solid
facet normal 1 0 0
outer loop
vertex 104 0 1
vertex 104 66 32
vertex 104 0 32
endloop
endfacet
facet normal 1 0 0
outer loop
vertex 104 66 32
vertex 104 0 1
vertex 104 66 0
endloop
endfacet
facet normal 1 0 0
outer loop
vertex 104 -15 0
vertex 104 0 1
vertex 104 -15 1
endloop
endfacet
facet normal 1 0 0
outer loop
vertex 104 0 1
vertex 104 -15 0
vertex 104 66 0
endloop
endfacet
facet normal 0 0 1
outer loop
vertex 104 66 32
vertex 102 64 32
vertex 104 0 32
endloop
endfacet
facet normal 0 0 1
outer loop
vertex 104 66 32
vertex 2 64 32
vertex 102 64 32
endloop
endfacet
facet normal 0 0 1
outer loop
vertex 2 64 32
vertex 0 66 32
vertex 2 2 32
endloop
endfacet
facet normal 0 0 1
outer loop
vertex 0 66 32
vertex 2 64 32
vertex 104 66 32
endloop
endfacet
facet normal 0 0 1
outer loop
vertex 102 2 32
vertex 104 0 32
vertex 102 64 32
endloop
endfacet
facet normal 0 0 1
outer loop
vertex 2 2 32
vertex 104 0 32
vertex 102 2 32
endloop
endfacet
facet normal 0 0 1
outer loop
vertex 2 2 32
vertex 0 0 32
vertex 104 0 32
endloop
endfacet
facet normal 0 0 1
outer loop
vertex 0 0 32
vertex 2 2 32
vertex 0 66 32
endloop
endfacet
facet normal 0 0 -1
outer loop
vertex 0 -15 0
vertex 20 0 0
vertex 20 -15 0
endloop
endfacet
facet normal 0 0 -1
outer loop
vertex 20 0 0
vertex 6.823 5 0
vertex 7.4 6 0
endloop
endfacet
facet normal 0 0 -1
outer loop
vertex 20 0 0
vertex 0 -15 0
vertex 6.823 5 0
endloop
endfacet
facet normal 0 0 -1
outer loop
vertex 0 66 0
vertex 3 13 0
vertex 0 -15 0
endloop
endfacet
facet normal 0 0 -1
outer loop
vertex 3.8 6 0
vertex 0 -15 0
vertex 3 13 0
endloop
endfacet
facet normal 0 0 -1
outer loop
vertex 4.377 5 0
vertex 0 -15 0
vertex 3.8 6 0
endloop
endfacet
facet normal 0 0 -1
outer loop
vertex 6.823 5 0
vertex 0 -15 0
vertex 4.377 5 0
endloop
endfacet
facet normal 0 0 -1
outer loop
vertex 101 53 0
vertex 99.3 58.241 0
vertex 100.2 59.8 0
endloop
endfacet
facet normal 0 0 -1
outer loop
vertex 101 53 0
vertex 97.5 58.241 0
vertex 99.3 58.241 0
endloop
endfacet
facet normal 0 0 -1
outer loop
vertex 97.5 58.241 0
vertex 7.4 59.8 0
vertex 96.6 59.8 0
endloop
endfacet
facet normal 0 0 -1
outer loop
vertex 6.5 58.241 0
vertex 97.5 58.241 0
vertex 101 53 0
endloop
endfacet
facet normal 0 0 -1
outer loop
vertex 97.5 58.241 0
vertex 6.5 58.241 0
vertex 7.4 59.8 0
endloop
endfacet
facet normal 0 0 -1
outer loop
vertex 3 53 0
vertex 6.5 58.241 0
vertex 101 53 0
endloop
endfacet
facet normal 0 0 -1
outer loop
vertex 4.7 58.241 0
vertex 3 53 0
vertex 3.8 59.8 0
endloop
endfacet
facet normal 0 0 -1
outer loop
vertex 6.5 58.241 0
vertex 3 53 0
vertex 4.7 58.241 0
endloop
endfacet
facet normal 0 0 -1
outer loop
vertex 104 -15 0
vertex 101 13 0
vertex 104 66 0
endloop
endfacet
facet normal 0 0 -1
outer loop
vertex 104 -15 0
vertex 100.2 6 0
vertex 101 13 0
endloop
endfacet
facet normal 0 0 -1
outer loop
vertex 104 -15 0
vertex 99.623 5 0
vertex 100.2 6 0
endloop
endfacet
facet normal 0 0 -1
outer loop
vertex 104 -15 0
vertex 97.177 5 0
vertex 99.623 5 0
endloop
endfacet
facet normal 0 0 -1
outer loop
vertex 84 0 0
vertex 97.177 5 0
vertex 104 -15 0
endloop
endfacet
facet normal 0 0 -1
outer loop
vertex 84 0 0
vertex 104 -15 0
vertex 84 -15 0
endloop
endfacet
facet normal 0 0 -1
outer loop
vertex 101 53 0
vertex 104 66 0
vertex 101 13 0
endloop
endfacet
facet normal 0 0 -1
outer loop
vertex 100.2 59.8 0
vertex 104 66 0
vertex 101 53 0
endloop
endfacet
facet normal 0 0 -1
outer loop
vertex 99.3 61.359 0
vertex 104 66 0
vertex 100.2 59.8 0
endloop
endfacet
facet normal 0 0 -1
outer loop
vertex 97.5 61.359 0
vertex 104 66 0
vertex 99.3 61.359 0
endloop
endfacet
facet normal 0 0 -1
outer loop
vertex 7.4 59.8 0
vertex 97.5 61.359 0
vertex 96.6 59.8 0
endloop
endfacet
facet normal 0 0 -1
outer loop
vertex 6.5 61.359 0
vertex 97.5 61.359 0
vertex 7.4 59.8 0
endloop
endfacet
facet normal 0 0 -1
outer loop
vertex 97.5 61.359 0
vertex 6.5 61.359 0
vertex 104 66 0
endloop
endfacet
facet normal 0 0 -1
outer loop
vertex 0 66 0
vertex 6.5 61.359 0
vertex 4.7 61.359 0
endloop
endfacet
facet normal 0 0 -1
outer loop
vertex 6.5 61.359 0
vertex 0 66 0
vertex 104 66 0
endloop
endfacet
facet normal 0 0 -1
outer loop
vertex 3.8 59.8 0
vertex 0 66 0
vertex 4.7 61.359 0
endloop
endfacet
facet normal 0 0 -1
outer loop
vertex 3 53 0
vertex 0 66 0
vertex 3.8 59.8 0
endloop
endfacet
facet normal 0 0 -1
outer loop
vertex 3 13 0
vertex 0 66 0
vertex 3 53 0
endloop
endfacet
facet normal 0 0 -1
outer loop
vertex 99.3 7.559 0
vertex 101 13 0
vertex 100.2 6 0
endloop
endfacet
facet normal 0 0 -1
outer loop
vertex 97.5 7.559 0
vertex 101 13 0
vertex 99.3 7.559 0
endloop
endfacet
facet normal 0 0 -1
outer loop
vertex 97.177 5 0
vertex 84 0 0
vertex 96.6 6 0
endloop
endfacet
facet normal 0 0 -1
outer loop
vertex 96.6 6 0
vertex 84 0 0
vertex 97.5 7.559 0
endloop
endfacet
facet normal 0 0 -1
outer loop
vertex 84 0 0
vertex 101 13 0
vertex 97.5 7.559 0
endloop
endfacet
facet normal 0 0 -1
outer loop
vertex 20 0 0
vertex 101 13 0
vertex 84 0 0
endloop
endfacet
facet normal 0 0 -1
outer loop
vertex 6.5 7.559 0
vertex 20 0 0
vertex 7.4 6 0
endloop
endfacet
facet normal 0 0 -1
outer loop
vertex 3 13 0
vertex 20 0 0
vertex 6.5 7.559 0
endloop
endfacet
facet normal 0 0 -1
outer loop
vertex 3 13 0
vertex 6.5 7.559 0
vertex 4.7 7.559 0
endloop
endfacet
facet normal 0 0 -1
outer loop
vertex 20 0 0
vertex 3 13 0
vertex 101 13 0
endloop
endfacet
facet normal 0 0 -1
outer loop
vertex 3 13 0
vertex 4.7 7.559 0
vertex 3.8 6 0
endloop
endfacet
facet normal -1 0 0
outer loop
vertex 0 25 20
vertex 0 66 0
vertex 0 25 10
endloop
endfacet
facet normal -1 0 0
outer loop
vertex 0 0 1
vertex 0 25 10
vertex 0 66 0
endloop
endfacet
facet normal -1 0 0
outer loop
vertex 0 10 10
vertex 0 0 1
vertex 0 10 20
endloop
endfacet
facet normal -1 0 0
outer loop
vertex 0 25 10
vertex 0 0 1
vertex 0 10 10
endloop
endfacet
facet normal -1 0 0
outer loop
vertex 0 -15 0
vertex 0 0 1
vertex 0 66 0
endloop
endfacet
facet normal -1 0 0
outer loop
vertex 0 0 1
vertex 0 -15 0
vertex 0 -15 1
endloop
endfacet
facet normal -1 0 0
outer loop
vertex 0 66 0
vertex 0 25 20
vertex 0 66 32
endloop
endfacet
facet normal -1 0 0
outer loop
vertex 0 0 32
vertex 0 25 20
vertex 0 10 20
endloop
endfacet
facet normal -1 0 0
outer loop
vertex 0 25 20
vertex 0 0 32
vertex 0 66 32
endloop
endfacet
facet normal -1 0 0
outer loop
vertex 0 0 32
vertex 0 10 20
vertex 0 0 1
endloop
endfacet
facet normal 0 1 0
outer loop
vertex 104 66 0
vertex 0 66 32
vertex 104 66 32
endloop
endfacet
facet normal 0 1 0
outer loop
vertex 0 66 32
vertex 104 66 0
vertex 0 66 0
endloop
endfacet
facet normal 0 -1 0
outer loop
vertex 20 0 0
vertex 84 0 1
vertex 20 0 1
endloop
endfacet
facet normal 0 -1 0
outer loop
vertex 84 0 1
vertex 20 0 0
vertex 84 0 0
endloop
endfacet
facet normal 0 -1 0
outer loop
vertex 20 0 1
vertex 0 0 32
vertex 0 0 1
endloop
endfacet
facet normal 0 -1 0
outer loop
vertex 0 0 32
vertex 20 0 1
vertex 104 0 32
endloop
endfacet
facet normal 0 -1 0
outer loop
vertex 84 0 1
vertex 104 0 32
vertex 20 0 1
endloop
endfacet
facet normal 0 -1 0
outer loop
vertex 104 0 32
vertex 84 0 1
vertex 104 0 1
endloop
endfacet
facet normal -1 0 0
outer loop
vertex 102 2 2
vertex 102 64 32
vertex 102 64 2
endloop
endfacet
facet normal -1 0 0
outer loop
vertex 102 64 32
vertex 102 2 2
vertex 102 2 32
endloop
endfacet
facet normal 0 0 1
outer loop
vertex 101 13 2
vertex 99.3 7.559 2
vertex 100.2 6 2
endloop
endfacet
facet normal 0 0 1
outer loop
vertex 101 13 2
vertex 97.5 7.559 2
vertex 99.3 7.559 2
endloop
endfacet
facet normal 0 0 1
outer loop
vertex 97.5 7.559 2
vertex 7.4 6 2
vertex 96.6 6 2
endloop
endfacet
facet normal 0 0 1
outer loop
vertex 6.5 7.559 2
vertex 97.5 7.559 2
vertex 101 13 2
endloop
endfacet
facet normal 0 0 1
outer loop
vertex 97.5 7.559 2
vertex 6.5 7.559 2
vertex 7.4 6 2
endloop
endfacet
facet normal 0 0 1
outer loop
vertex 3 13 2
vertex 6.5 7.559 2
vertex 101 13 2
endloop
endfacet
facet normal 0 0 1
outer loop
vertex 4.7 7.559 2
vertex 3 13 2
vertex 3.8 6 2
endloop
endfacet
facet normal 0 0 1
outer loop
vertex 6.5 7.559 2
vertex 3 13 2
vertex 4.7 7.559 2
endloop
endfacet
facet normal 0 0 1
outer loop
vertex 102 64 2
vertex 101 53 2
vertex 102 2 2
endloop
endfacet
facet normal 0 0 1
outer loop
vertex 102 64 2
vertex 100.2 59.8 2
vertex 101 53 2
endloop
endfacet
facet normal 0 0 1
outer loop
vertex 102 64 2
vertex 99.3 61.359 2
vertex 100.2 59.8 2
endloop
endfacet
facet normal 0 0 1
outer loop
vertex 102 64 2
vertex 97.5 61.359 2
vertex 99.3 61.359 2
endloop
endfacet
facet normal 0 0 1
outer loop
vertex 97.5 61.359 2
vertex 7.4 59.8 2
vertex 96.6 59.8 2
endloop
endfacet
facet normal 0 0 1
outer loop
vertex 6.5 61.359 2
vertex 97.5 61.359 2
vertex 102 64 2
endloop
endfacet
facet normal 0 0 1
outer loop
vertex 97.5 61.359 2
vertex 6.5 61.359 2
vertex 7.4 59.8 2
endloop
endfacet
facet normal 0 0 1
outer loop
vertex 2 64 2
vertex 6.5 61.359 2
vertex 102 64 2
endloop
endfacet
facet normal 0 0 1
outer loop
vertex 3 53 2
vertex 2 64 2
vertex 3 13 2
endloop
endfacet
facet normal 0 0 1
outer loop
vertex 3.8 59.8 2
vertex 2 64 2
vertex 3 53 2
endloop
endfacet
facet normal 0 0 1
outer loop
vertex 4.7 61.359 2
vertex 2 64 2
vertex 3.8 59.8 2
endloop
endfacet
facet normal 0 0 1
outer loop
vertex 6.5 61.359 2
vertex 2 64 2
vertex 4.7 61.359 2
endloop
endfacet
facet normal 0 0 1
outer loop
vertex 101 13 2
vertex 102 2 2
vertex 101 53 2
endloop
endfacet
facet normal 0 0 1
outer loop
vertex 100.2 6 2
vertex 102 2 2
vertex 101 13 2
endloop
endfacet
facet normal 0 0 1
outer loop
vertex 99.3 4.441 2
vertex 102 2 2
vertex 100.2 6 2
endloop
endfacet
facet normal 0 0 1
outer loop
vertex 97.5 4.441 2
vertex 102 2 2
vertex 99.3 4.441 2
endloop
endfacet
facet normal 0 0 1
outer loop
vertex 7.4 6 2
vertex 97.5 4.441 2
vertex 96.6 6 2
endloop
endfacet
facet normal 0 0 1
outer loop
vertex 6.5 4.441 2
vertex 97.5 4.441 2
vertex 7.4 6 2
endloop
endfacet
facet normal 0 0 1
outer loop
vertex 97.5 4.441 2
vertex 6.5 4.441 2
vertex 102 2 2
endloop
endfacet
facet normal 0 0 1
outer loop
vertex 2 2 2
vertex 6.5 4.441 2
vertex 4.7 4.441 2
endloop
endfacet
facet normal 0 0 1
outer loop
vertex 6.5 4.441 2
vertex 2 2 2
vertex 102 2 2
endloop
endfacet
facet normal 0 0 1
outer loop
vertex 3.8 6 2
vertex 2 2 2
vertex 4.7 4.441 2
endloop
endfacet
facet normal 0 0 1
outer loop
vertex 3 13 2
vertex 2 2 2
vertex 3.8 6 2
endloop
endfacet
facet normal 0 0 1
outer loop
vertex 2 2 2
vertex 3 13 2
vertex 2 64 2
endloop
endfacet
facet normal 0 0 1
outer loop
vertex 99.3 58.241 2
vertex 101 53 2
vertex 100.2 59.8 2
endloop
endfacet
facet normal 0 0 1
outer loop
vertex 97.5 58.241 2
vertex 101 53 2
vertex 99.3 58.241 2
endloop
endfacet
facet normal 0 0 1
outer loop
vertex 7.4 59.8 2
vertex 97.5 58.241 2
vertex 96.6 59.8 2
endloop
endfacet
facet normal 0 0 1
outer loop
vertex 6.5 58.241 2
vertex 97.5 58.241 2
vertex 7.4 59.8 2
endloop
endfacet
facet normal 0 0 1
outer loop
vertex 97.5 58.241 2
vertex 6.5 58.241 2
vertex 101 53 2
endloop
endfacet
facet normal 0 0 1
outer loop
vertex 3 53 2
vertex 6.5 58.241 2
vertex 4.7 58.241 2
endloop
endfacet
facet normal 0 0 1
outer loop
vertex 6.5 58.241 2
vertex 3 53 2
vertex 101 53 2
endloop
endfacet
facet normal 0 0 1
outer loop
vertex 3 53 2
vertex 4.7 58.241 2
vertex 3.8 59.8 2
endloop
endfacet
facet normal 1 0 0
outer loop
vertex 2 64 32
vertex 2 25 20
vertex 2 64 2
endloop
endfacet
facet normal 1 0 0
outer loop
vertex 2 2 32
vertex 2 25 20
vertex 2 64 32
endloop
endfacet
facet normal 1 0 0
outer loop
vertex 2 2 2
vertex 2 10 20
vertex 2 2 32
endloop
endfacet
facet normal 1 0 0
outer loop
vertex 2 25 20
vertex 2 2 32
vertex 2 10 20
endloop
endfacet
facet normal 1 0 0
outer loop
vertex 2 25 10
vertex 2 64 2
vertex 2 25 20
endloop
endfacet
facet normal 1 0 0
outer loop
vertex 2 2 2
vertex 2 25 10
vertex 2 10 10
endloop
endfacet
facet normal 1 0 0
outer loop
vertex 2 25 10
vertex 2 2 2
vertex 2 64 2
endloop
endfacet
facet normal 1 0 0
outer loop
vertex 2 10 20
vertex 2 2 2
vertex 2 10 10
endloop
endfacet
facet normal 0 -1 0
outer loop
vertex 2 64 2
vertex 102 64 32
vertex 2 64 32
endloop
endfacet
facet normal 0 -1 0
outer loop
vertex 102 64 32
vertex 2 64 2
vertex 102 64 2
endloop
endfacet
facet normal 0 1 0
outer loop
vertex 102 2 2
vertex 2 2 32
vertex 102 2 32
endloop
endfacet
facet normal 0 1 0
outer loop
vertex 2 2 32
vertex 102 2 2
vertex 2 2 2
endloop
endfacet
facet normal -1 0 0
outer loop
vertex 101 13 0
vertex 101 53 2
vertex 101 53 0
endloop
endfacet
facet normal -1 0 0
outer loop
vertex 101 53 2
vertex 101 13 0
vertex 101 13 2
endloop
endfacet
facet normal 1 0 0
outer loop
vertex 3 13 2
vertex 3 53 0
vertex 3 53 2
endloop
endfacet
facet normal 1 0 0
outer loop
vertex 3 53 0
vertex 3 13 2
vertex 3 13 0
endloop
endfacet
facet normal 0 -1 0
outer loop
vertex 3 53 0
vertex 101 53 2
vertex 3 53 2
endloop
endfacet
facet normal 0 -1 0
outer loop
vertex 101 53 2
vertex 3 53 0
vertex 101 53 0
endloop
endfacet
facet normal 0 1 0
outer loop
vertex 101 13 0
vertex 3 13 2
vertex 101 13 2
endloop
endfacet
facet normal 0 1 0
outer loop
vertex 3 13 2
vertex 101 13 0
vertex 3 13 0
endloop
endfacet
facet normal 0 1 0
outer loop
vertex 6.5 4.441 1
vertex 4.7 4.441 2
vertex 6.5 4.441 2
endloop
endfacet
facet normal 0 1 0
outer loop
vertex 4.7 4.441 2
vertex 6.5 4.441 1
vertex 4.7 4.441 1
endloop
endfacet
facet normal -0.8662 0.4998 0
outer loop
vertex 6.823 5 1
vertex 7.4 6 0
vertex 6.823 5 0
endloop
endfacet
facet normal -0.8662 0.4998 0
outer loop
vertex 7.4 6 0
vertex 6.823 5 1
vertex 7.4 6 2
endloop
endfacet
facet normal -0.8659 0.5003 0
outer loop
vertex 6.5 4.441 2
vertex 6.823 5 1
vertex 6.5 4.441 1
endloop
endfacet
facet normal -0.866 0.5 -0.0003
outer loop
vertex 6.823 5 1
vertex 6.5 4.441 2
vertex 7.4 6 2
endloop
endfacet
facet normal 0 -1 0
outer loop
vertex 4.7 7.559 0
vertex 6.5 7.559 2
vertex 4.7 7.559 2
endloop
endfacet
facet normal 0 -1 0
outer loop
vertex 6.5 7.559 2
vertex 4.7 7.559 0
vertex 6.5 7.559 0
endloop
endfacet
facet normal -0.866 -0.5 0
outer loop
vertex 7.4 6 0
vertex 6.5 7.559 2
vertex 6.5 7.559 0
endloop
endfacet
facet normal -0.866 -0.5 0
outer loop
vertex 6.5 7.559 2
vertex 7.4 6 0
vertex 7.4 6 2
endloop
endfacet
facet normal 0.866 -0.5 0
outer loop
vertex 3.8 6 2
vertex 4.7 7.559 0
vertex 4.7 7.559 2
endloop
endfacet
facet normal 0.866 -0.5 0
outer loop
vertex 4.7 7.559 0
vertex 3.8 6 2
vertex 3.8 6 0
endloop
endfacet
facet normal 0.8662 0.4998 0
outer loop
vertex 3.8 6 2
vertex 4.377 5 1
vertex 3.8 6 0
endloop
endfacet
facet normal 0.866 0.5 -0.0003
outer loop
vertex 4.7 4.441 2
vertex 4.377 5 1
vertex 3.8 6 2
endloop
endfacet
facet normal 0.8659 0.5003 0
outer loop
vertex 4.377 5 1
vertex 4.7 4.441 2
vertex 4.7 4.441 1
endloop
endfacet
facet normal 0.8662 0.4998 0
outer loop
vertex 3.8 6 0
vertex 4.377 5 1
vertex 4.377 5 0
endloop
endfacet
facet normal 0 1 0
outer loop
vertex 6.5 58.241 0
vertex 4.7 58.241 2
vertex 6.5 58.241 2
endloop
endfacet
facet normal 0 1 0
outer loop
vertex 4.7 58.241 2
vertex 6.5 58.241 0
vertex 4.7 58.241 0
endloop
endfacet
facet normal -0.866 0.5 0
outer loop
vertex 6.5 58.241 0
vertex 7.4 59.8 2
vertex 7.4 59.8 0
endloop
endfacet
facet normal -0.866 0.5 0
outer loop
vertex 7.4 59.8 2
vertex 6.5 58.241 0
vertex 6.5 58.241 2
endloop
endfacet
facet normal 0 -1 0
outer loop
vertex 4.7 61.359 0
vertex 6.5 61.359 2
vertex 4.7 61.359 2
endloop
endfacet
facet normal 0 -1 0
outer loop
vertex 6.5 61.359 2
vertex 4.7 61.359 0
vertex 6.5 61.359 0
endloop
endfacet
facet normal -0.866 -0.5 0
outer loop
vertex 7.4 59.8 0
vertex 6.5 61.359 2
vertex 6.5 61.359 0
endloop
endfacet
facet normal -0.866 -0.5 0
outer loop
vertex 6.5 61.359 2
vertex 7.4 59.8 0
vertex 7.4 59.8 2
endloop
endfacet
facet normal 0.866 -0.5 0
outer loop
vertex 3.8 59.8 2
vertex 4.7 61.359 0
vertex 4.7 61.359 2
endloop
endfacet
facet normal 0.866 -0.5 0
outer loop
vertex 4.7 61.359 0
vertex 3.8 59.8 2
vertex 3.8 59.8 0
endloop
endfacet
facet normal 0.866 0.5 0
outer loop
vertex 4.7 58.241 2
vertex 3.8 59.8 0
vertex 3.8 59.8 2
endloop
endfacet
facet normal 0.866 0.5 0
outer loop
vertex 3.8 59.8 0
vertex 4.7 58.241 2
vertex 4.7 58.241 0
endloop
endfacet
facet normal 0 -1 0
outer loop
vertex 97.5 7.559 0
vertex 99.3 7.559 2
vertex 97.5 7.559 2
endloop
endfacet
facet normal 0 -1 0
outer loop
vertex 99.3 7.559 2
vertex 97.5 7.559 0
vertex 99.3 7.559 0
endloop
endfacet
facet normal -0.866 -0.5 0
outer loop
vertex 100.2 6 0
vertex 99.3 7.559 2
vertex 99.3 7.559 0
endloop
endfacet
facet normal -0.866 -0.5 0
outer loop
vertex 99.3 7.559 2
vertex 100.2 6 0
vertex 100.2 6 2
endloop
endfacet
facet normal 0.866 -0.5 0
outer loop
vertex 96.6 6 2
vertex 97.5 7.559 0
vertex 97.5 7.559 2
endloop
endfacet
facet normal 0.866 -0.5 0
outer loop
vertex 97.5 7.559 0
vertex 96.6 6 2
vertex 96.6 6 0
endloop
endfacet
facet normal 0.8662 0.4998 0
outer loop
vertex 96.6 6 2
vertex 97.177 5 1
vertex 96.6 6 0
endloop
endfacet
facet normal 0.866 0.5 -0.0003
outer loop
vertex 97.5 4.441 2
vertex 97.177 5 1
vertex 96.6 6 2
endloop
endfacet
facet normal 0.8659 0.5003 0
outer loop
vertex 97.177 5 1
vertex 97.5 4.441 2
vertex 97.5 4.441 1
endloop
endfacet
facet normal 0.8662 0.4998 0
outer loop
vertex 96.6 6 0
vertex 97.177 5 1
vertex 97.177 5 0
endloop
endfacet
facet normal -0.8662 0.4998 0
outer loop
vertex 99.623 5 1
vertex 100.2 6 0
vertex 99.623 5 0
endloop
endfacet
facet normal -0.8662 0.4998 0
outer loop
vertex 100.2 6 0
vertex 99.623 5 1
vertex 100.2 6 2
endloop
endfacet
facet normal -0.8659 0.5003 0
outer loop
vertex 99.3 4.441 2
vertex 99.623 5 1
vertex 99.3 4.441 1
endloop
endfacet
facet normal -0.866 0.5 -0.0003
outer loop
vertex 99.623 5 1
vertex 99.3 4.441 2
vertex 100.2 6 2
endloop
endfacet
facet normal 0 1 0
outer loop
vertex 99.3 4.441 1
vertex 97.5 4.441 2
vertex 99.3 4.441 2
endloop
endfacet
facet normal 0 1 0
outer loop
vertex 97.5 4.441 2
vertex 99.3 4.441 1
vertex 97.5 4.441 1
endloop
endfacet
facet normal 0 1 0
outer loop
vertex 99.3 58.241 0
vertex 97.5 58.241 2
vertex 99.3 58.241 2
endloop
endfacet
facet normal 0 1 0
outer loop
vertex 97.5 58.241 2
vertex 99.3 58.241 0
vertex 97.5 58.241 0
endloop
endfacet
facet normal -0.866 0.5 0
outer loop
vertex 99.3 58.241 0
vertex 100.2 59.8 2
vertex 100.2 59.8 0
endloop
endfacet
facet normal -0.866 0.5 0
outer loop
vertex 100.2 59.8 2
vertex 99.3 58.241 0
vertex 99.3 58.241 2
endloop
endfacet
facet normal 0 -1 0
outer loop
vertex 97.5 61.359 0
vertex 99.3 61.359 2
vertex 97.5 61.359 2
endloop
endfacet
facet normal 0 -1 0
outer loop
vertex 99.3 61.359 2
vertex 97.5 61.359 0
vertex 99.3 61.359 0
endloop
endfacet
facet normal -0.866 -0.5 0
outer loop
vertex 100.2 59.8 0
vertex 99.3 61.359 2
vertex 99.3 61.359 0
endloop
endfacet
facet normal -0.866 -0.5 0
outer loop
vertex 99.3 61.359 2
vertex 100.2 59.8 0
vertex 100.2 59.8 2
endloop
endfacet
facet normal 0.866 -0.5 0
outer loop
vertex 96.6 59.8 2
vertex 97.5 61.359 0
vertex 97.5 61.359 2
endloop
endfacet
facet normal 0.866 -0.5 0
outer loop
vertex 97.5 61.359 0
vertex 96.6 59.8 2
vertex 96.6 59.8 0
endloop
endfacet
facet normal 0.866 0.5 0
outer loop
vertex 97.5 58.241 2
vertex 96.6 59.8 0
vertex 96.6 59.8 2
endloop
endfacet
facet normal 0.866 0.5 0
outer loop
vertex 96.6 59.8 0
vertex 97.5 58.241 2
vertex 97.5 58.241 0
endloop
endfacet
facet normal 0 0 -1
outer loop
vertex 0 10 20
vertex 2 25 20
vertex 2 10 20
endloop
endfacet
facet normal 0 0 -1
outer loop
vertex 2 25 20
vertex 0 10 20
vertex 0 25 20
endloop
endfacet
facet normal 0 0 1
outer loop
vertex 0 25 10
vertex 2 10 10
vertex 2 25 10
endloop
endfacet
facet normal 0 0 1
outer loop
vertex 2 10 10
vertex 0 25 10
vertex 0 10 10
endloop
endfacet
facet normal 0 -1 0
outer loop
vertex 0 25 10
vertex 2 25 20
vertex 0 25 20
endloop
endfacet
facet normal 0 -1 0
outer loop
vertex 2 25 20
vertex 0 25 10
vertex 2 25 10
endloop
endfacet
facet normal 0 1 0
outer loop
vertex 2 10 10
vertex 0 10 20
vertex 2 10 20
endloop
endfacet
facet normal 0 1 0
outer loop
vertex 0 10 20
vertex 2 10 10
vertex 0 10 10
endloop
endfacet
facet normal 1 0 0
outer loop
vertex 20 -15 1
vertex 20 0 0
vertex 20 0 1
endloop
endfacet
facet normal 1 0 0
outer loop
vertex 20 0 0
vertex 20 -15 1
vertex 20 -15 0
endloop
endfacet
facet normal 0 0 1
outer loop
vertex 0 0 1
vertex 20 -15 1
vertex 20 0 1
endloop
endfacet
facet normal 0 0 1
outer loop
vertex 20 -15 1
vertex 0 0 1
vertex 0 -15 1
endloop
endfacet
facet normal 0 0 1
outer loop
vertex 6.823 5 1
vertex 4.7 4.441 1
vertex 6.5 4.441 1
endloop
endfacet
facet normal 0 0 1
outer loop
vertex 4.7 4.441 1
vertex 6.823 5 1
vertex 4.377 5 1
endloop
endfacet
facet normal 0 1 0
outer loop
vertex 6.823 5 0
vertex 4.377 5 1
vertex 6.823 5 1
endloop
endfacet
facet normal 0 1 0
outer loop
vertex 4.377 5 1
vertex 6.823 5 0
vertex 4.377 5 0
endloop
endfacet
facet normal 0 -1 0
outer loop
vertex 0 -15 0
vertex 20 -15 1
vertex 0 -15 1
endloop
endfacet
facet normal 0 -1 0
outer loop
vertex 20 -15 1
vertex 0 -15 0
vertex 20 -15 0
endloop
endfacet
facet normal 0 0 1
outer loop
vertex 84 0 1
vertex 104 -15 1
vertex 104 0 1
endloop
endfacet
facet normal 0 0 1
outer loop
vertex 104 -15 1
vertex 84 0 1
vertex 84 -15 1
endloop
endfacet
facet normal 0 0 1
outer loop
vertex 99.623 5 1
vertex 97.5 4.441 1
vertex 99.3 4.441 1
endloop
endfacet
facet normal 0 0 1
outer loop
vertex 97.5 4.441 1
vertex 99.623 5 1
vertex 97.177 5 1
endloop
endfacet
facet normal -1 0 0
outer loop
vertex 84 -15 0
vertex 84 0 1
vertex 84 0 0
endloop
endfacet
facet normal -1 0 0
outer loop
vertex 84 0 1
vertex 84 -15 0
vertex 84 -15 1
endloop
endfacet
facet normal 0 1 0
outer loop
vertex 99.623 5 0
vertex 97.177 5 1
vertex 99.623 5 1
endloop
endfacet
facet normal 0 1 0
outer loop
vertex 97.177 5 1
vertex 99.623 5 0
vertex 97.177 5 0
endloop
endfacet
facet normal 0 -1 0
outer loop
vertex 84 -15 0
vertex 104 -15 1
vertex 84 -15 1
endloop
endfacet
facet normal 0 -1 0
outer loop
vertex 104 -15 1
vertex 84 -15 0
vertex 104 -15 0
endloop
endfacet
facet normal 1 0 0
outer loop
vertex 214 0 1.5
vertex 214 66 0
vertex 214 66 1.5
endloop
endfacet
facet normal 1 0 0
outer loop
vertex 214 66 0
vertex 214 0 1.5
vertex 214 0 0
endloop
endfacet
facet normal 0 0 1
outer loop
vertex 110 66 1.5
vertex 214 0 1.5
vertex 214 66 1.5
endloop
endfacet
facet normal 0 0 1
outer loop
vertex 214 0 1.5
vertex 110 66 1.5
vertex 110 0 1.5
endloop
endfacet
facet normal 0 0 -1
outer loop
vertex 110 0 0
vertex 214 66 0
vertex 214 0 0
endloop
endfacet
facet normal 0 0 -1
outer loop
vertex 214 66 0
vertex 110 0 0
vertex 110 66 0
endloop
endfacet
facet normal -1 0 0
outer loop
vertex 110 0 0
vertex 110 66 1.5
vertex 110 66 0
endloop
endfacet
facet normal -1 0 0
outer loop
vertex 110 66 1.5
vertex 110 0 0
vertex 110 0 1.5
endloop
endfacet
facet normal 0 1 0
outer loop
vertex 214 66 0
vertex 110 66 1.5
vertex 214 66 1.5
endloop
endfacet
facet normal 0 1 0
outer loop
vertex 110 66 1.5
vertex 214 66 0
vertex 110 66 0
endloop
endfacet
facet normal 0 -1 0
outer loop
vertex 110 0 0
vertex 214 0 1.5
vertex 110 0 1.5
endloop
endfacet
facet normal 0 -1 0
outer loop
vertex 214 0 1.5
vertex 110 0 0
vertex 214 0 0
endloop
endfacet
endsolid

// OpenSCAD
// Box for 4-row 20-column 7-segment display

// Wall Thickness
width = 2;

// width, height of board itself
//board = [98.25, 60];
//board = [98.4, 60];
board = [100, 62];

// width, height of display itself
display = [98, 40];
// Added 1 to balance it better/clear the wall
disp_inset = 11;

// Height of workpiece
front_depth = 30;
//front_depth = 20;
//front_depth = 10;
//front_depth = 5;

// Standoff diameter
standoff = 3.6;

// Tab width, height, thickness
tab = [20, 15, 1];


module front(){
    difference(){
        
        // Starter Box
        cube([
            board[0] + 2*width,
            board[1] + 2*width,
            front_depth + width
        ]);
        
        // Hollow it out
        translate([width, width, width])
            cube([
                board[0],
                board[1],
                front_depth
            ]);
        
        //
        // Hole for display
        //
        translate([
            ((board[0] - display[0]) / 2) + width,
            disp_inset + width,
            0
        ])
            cube([
                display[0],
                display[1],
                width
            ]);
          
        //  
        // Holes for standoffs
        //
        translate([
            width + standoff,
            disp_inset - 5,
            0
        ])
            cylinder(width, d=standoff);

        translate([
            width + standoff,
            width + disp_inset + display[1] + standoff/2 + 5,
            0
        ])
            cylinder(width, d=standoff);

        translate([
            board[0] + width - standoff,
            disp_inset - 5,
            0
        ])
            cylinder(width, d=standoff);
                        
        translate([
            board[0] + width - standoff,
            width + disp_inset + display[1] + standoff/2 + 5,
            0
        ])
            cylinder(width, d=standoff);
     
        //
        // Hole for USB
        //
        translate([
            -1,
            10,
            10
        ])
            cube([10, 15, 10]);
    }
    
    //
    // Tilt Tabs
    //
    translate([0, -tab[1], 0,]) cube([tab[0], tab[1] + 5, tab[2]]);
    translate([board[0] + 2*width - tab[0], -tab[1], 0,]) cube([tab[0], tab[1] + 5, tab[2]]);

}

module cover(){
    cube([
        board[0] + 2*width,
        board[1] + 2*width,
//        width,
        1.5,
    ]);
}


front();

translate([110, 0, 0])
    cover();
